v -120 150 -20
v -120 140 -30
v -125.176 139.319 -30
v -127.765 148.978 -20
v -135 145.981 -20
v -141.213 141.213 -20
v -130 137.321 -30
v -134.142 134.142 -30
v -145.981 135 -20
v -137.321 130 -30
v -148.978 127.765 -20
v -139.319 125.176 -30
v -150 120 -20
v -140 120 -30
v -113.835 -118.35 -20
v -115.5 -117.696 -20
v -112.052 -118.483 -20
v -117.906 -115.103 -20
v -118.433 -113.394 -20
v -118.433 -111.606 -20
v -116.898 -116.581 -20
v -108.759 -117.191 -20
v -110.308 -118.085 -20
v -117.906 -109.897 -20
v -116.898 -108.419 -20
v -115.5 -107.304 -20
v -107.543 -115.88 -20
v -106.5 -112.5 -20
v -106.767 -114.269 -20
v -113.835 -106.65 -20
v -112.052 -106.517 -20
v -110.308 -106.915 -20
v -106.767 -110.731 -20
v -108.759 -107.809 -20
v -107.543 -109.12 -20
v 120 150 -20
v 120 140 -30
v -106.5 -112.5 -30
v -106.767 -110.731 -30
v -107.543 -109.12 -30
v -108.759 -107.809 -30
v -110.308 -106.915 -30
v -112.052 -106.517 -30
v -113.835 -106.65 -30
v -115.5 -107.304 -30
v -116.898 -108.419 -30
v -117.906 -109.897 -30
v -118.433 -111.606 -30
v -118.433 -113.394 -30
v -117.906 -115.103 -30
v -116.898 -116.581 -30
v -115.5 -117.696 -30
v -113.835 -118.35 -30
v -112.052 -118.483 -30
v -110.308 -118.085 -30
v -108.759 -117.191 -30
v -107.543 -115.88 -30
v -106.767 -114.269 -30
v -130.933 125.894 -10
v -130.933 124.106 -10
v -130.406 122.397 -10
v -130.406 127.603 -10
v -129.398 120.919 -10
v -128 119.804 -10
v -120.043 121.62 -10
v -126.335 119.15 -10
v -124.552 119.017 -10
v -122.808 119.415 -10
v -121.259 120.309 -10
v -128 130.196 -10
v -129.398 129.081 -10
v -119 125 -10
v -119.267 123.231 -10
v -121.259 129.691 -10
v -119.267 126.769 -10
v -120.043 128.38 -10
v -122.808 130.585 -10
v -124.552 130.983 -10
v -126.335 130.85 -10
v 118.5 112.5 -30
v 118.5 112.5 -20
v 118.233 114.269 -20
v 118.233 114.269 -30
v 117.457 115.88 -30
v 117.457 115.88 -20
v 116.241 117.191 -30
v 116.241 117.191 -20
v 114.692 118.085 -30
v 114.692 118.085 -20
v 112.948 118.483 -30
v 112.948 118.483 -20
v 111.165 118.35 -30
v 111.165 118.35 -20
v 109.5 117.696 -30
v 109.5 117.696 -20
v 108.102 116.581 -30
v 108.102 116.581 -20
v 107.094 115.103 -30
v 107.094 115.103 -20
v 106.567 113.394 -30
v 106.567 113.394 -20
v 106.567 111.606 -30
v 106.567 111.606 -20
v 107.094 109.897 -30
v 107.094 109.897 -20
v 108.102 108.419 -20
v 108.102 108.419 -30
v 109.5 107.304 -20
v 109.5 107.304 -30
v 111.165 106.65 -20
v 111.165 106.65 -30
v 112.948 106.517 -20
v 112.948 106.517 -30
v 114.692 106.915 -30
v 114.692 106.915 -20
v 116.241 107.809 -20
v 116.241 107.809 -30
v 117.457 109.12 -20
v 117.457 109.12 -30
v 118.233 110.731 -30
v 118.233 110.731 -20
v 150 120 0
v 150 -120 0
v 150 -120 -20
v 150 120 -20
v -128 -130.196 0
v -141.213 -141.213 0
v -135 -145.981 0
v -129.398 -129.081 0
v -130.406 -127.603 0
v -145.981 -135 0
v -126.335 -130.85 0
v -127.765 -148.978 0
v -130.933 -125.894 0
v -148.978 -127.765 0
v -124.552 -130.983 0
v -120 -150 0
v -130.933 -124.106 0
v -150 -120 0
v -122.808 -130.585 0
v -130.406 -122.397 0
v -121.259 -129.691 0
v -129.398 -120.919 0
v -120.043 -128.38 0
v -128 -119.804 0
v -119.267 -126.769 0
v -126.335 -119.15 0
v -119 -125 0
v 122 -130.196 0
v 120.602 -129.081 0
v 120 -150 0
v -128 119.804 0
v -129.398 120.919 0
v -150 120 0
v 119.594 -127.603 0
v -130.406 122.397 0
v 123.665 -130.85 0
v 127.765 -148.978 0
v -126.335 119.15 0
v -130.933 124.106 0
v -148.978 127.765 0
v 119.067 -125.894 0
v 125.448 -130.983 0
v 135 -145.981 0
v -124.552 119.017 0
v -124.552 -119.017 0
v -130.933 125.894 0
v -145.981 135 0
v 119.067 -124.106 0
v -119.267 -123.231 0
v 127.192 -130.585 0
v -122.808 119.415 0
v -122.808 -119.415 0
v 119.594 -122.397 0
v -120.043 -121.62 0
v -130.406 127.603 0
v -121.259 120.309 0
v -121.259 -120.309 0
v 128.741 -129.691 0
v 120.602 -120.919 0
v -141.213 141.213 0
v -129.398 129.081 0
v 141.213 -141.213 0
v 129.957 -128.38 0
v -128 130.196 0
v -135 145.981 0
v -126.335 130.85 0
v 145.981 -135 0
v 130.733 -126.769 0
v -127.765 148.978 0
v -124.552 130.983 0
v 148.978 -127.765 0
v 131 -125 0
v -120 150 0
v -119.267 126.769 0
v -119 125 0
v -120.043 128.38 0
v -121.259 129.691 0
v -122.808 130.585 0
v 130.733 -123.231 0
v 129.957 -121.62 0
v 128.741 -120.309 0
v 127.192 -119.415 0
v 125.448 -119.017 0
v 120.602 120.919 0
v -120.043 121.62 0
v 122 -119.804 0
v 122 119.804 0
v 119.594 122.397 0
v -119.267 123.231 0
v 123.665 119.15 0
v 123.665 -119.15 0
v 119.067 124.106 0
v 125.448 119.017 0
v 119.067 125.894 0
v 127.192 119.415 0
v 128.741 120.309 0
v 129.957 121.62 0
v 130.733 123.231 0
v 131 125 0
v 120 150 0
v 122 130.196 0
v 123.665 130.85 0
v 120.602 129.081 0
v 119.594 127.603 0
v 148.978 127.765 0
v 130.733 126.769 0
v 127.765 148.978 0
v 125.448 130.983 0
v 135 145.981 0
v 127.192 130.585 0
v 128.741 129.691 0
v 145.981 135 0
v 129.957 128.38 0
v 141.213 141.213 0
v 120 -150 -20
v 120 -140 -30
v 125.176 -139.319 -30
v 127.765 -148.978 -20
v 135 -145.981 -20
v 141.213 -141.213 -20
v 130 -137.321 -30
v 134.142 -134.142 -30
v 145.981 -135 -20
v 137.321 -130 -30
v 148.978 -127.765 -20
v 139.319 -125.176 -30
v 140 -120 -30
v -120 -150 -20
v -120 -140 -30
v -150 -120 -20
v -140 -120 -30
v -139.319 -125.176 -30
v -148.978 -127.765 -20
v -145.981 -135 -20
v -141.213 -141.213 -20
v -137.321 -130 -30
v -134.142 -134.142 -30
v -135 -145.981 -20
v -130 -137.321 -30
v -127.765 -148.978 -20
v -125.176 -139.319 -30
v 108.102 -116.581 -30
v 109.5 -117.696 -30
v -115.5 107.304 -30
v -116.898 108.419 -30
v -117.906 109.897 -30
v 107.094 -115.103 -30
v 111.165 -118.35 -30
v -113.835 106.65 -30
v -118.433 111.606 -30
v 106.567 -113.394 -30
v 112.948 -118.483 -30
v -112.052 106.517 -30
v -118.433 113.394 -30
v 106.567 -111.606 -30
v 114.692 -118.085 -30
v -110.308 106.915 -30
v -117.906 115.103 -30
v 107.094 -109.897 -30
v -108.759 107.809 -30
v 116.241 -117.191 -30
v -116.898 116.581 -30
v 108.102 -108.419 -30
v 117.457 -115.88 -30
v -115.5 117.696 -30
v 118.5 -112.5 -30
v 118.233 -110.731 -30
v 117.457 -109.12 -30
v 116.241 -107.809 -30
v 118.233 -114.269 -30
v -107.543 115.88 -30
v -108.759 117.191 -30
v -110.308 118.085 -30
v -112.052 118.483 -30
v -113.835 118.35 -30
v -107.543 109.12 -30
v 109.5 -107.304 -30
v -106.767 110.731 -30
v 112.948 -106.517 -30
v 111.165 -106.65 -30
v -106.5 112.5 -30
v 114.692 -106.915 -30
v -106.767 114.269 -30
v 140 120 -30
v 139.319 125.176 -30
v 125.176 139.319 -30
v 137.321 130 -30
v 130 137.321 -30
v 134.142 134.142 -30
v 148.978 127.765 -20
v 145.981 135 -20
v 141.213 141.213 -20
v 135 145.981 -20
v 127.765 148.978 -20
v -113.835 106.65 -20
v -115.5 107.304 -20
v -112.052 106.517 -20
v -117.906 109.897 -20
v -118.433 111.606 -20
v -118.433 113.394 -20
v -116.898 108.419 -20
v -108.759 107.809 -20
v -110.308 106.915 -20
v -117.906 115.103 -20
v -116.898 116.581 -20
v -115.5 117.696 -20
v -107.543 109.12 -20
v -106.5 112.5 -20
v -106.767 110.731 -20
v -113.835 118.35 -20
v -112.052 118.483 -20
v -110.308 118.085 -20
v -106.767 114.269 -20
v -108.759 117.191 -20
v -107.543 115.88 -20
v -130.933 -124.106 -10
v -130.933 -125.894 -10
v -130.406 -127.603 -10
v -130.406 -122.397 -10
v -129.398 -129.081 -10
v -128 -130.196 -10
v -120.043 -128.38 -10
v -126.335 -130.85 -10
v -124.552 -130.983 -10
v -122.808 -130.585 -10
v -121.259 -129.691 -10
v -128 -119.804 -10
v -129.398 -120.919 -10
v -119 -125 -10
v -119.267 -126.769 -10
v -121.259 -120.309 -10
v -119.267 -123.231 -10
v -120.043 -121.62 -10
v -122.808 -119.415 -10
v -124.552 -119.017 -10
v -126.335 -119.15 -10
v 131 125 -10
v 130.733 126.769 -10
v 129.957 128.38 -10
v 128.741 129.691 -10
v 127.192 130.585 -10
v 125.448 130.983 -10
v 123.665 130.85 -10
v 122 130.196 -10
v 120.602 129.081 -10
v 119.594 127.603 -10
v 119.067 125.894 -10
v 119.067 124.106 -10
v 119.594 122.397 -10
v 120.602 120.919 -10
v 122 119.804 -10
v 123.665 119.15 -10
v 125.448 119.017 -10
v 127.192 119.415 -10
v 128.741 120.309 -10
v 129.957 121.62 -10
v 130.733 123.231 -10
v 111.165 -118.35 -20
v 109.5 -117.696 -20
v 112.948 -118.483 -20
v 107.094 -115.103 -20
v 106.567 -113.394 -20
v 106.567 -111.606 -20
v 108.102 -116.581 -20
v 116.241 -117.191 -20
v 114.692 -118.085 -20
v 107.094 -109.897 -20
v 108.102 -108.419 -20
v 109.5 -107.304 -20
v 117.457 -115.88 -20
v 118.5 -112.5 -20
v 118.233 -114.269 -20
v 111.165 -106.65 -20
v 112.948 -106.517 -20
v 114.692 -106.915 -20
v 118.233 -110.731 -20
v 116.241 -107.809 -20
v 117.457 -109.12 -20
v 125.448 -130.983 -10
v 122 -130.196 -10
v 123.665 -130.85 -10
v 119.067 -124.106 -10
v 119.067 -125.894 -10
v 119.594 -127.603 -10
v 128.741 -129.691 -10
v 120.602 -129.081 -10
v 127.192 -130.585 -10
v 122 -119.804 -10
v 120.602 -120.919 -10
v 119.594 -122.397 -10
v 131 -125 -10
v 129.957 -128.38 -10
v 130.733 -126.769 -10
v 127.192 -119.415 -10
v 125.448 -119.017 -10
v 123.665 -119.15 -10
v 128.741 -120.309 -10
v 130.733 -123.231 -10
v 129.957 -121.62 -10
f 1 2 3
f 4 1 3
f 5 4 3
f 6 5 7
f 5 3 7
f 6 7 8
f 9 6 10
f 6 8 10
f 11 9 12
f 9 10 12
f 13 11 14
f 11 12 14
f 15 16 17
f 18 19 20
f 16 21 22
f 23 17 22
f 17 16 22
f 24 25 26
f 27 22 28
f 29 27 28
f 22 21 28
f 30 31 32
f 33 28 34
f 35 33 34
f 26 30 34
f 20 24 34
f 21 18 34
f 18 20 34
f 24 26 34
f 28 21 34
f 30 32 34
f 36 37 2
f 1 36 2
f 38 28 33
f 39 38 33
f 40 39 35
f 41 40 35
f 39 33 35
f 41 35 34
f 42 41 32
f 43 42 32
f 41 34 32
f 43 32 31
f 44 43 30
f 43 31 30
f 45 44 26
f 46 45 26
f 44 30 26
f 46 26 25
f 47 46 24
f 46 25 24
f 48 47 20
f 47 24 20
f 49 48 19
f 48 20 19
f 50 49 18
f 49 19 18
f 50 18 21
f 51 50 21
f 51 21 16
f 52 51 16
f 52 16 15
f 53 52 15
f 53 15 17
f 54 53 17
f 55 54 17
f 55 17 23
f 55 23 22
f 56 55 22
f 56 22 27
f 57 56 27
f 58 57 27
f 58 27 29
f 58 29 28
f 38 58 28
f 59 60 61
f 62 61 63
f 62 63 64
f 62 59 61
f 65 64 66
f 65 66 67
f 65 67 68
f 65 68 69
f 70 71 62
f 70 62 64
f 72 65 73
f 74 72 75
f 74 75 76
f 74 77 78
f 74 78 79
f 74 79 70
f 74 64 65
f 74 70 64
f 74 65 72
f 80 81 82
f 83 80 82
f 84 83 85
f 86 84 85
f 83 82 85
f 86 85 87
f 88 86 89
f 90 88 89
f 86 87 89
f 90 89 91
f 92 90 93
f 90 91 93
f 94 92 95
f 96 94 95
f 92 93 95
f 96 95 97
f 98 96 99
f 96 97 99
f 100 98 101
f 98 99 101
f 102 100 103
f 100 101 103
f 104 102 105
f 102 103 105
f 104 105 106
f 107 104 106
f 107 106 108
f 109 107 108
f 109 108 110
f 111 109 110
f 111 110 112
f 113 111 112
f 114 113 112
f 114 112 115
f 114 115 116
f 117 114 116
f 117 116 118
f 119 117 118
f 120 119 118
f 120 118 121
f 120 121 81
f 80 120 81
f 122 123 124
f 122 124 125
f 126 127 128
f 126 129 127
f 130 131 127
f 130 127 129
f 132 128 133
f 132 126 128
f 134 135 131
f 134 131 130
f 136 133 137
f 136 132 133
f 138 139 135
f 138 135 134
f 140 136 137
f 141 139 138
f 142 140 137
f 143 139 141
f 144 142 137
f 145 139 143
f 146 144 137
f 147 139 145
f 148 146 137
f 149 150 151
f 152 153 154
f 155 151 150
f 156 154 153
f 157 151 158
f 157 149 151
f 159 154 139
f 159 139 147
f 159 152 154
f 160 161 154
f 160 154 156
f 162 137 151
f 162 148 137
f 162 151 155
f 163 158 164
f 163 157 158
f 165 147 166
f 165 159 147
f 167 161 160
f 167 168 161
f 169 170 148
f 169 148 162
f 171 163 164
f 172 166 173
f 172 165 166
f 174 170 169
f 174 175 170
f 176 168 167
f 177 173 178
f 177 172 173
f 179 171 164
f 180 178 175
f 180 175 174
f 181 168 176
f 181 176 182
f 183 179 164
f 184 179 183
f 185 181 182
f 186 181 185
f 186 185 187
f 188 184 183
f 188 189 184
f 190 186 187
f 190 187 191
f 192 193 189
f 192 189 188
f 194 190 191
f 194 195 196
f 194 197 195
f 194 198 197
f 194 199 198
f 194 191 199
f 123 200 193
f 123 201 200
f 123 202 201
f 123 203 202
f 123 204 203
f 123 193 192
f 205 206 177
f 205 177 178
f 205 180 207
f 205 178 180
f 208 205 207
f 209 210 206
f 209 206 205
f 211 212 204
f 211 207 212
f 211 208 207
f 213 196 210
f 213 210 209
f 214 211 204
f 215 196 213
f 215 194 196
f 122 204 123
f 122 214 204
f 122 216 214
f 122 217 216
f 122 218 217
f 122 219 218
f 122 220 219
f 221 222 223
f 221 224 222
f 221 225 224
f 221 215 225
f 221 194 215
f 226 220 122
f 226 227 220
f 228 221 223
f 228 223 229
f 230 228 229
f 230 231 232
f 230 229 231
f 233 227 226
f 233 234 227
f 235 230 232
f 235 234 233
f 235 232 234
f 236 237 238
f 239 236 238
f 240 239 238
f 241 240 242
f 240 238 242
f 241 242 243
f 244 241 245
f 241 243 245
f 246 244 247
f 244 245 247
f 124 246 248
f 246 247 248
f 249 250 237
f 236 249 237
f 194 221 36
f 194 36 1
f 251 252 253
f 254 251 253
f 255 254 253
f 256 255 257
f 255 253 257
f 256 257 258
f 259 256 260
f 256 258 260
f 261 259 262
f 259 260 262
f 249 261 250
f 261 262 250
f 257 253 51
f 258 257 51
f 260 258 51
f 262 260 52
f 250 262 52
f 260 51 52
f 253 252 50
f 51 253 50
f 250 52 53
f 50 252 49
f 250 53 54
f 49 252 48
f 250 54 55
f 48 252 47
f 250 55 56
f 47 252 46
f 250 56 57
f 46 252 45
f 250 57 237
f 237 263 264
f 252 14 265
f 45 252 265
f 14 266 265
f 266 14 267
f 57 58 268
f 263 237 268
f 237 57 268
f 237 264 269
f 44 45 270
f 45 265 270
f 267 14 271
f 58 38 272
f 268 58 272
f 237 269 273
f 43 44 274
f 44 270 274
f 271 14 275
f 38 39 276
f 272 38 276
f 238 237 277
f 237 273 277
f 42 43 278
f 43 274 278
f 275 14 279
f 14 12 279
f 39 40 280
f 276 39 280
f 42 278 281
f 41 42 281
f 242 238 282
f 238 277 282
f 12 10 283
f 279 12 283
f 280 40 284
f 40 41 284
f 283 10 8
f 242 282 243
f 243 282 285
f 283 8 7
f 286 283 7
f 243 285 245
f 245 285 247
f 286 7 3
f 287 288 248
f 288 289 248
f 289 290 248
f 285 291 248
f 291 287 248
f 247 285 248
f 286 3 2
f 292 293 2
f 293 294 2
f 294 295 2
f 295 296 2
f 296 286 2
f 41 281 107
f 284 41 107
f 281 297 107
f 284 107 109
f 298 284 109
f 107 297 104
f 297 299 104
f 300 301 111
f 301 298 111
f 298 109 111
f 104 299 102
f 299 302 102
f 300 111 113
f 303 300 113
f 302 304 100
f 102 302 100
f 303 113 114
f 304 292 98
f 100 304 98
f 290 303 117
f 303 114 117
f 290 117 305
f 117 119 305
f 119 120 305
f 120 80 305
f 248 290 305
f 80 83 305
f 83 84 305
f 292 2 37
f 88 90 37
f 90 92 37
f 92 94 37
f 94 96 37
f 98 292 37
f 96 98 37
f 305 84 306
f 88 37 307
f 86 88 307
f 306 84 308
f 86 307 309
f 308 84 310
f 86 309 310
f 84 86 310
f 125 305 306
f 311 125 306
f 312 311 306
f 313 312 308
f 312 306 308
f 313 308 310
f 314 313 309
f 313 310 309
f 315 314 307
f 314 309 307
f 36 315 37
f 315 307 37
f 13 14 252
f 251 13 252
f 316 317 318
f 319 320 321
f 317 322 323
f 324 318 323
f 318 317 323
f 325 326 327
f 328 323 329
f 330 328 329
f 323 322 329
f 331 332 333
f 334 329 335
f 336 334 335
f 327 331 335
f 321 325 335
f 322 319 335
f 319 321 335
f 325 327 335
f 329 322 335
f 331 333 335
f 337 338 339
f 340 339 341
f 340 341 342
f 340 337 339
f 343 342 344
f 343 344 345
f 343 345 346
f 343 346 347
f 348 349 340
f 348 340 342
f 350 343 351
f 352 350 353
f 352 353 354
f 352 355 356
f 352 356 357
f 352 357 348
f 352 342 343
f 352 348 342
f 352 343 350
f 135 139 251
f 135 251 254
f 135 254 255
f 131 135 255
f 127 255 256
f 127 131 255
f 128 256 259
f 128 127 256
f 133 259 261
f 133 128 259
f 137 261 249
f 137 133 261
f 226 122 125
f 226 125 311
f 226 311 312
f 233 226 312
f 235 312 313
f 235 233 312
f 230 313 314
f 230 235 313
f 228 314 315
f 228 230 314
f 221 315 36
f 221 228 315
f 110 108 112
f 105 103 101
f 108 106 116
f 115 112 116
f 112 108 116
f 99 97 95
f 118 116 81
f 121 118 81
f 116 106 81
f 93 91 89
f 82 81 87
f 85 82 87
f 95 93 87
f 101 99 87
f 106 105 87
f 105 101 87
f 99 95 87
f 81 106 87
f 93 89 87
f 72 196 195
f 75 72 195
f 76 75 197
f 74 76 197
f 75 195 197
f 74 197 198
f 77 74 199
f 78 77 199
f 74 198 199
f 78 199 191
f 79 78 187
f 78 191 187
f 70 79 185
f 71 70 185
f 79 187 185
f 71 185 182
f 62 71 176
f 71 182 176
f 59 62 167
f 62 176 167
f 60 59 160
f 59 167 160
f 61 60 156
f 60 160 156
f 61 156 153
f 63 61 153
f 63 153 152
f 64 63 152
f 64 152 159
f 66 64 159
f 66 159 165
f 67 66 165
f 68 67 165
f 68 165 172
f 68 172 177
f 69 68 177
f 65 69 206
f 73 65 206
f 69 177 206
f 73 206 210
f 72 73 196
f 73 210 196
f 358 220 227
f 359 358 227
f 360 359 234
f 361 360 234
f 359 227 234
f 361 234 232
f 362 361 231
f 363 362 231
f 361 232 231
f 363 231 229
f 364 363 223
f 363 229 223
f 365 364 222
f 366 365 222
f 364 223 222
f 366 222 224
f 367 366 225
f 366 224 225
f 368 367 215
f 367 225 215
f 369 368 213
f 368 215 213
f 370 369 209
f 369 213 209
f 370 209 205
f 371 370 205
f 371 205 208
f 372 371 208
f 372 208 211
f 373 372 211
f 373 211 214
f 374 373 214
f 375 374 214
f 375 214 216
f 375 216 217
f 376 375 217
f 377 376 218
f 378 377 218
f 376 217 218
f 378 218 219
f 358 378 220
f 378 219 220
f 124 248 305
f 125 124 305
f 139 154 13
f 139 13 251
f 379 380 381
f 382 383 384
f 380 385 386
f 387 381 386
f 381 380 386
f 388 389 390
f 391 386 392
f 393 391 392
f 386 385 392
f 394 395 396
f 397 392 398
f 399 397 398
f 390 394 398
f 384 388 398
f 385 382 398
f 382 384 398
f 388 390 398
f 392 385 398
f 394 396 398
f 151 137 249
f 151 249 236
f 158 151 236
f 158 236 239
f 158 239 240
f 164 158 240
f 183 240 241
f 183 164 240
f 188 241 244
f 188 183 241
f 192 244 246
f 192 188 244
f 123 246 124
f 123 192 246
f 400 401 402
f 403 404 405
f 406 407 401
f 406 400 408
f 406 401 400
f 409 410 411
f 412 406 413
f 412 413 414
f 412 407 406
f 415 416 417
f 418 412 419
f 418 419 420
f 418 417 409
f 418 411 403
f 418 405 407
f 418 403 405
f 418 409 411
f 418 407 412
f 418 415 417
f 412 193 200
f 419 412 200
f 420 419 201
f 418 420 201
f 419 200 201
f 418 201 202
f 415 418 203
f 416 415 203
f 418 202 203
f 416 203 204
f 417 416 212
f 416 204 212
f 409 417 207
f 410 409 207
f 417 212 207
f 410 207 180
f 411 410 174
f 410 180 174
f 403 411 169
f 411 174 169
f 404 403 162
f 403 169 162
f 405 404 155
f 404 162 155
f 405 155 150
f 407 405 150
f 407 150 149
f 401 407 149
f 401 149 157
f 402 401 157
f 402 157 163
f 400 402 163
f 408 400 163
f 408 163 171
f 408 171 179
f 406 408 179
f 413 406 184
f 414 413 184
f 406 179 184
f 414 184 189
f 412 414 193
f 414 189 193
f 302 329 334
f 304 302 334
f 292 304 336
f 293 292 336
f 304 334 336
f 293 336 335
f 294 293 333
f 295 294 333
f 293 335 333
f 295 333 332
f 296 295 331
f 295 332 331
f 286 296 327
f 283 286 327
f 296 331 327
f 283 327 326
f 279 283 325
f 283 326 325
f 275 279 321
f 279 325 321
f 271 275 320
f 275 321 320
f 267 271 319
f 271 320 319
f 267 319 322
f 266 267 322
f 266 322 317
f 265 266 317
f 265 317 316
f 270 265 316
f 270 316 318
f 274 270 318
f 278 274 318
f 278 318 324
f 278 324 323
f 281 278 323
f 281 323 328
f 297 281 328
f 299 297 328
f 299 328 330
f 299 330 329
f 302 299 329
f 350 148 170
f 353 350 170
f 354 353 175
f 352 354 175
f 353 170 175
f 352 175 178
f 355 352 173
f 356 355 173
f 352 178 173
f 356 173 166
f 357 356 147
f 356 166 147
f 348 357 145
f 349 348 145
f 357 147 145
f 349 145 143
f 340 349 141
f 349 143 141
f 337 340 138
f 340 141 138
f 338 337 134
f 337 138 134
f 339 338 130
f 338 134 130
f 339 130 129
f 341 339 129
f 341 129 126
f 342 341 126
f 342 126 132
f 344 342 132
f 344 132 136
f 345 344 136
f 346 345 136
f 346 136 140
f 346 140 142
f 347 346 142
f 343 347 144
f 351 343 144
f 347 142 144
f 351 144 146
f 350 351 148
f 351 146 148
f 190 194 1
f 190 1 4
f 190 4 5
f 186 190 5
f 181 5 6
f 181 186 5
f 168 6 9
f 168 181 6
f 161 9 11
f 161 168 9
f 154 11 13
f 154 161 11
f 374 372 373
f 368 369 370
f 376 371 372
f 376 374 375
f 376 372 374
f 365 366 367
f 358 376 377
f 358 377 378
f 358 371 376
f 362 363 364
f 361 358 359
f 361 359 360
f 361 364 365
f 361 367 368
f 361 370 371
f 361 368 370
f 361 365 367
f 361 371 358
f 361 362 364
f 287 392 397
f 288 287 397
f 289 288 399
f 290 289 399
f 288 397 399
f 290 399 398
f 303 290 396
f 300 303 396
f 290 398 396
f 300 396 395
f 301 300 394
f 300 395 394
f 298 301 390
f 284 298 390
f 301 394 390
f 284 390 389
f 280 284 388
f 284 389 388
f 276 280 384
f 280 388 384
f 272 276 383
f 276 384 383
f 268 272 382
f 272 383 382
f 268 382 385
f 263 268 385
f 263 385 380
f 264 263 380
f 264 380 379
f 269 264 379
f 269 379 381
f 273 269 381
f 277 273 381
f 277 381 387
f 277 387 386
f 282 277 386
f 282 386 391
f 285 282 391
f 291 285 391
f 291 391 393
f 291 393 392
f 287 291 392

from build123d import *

# Parameters (mm, degrees)
F0_R     = 6
F1_DEPTH = 30
F2_SIZE2 = 10
F2_SIZE  = 10
F3_DEPTH = 10
F4_DEPTH = 20


with BuildPart() as f1:
    # F0 (on Top) → F1 (new body)
    with BuildSketch(Plane.XY):
        with BuildLine():
            ThreePointArc((150, 120), (141.213203, 141.213203), (120, 150))
            Line((120, 150), (-120, 150))
            ThreePointArc((-120, 150), (-141.213203, 141.213203), (-150, 120))
            Line((-150, 120), (-150, -120))
            ThreePointArc((-150, -120), (-141.213203, -141.213203), (-120, -150))
            Line((-120, -150), (120, -150))
            ThreePointArc((120, -150), (141.213203, -141.213203), (150, -120))
            Line((150, -120), (150, 120))
        make_face()
        with Locations((-125, -125)):
            Circle(F0_R, mode=Mode.SUBTRACT)
        with Locations((-112.5, -112.5)):
            Circle(F0_R, mode=Mode.SUBTRACT)
        with Locations((125, -125)):
            Circle(F0_R, mode=Mode.SUBTRACT)
        with Locations((112.5, -112.5)):
            Circle(F0_R, mode=Mode.SUBTRACT)
        with Locations((-125, 125)):
            Circle(F0_R, mode=Mode.SUBTRACT)
        with Locations((-112.5, 112.5)):
            Circle(F0_R, mode=Mode.SUBTRACT)
        with Locations((112.5, 112.5)):
            Circle(F0_R, mode=Mode.SUBTRACT)
        with Locations((125, 125)):
            Circle(F0_R, mode=Mode.SUBTRACT)
        with Locations((-125, 125)):
            Circle(F0_R)
        with Locations((125, 125)):
            Circle(F0_R)
        with Locations((125, -125)):
            Circle(F0_R)
        with Locations((-125, -125)):
            Circle(F0_R)
    extrude(amount=-F1_DEPTH)

    # F2
    f2_edges = [f1.edges().sort_by_distance(p)[0] for p in [
        (0, 150, -30),
    ]]
    chamfer(f2_edges, length=F2_SIZE, length2=F2_SIZE2)

    # F0 (on Top) → F3 (cut)
    with BuildSketch(Plane.XY):
        with Locations((-125, 125)):
            Circle(F0_R)
        with Locations((125, 125)):
            Circle(F0_R)
        with Locations((-125, -125)):
            Circle(F0_R)
        with Locations((125, -125)):
            Circle(F0_R)
    extrude(amount=-F3_DEPTH, mode=Mode.SUBTRACT)

    # F0 (on Top) → F4 (join)
    with BuildSketch(Plane.XY):
        with Locations((-112.5, 112.5)):
            Circle(F0_R)
        with Locations((112.5, 112.5)):
            Circle(F0_R)
        with Locations((112.5, -112.5)):
            Circle(F0_R)
        with Locations((-112.5, -112.5)):
            Circle(F0_R)
    extrude(amount=-F4_DEPTH)


solid = f1.part
